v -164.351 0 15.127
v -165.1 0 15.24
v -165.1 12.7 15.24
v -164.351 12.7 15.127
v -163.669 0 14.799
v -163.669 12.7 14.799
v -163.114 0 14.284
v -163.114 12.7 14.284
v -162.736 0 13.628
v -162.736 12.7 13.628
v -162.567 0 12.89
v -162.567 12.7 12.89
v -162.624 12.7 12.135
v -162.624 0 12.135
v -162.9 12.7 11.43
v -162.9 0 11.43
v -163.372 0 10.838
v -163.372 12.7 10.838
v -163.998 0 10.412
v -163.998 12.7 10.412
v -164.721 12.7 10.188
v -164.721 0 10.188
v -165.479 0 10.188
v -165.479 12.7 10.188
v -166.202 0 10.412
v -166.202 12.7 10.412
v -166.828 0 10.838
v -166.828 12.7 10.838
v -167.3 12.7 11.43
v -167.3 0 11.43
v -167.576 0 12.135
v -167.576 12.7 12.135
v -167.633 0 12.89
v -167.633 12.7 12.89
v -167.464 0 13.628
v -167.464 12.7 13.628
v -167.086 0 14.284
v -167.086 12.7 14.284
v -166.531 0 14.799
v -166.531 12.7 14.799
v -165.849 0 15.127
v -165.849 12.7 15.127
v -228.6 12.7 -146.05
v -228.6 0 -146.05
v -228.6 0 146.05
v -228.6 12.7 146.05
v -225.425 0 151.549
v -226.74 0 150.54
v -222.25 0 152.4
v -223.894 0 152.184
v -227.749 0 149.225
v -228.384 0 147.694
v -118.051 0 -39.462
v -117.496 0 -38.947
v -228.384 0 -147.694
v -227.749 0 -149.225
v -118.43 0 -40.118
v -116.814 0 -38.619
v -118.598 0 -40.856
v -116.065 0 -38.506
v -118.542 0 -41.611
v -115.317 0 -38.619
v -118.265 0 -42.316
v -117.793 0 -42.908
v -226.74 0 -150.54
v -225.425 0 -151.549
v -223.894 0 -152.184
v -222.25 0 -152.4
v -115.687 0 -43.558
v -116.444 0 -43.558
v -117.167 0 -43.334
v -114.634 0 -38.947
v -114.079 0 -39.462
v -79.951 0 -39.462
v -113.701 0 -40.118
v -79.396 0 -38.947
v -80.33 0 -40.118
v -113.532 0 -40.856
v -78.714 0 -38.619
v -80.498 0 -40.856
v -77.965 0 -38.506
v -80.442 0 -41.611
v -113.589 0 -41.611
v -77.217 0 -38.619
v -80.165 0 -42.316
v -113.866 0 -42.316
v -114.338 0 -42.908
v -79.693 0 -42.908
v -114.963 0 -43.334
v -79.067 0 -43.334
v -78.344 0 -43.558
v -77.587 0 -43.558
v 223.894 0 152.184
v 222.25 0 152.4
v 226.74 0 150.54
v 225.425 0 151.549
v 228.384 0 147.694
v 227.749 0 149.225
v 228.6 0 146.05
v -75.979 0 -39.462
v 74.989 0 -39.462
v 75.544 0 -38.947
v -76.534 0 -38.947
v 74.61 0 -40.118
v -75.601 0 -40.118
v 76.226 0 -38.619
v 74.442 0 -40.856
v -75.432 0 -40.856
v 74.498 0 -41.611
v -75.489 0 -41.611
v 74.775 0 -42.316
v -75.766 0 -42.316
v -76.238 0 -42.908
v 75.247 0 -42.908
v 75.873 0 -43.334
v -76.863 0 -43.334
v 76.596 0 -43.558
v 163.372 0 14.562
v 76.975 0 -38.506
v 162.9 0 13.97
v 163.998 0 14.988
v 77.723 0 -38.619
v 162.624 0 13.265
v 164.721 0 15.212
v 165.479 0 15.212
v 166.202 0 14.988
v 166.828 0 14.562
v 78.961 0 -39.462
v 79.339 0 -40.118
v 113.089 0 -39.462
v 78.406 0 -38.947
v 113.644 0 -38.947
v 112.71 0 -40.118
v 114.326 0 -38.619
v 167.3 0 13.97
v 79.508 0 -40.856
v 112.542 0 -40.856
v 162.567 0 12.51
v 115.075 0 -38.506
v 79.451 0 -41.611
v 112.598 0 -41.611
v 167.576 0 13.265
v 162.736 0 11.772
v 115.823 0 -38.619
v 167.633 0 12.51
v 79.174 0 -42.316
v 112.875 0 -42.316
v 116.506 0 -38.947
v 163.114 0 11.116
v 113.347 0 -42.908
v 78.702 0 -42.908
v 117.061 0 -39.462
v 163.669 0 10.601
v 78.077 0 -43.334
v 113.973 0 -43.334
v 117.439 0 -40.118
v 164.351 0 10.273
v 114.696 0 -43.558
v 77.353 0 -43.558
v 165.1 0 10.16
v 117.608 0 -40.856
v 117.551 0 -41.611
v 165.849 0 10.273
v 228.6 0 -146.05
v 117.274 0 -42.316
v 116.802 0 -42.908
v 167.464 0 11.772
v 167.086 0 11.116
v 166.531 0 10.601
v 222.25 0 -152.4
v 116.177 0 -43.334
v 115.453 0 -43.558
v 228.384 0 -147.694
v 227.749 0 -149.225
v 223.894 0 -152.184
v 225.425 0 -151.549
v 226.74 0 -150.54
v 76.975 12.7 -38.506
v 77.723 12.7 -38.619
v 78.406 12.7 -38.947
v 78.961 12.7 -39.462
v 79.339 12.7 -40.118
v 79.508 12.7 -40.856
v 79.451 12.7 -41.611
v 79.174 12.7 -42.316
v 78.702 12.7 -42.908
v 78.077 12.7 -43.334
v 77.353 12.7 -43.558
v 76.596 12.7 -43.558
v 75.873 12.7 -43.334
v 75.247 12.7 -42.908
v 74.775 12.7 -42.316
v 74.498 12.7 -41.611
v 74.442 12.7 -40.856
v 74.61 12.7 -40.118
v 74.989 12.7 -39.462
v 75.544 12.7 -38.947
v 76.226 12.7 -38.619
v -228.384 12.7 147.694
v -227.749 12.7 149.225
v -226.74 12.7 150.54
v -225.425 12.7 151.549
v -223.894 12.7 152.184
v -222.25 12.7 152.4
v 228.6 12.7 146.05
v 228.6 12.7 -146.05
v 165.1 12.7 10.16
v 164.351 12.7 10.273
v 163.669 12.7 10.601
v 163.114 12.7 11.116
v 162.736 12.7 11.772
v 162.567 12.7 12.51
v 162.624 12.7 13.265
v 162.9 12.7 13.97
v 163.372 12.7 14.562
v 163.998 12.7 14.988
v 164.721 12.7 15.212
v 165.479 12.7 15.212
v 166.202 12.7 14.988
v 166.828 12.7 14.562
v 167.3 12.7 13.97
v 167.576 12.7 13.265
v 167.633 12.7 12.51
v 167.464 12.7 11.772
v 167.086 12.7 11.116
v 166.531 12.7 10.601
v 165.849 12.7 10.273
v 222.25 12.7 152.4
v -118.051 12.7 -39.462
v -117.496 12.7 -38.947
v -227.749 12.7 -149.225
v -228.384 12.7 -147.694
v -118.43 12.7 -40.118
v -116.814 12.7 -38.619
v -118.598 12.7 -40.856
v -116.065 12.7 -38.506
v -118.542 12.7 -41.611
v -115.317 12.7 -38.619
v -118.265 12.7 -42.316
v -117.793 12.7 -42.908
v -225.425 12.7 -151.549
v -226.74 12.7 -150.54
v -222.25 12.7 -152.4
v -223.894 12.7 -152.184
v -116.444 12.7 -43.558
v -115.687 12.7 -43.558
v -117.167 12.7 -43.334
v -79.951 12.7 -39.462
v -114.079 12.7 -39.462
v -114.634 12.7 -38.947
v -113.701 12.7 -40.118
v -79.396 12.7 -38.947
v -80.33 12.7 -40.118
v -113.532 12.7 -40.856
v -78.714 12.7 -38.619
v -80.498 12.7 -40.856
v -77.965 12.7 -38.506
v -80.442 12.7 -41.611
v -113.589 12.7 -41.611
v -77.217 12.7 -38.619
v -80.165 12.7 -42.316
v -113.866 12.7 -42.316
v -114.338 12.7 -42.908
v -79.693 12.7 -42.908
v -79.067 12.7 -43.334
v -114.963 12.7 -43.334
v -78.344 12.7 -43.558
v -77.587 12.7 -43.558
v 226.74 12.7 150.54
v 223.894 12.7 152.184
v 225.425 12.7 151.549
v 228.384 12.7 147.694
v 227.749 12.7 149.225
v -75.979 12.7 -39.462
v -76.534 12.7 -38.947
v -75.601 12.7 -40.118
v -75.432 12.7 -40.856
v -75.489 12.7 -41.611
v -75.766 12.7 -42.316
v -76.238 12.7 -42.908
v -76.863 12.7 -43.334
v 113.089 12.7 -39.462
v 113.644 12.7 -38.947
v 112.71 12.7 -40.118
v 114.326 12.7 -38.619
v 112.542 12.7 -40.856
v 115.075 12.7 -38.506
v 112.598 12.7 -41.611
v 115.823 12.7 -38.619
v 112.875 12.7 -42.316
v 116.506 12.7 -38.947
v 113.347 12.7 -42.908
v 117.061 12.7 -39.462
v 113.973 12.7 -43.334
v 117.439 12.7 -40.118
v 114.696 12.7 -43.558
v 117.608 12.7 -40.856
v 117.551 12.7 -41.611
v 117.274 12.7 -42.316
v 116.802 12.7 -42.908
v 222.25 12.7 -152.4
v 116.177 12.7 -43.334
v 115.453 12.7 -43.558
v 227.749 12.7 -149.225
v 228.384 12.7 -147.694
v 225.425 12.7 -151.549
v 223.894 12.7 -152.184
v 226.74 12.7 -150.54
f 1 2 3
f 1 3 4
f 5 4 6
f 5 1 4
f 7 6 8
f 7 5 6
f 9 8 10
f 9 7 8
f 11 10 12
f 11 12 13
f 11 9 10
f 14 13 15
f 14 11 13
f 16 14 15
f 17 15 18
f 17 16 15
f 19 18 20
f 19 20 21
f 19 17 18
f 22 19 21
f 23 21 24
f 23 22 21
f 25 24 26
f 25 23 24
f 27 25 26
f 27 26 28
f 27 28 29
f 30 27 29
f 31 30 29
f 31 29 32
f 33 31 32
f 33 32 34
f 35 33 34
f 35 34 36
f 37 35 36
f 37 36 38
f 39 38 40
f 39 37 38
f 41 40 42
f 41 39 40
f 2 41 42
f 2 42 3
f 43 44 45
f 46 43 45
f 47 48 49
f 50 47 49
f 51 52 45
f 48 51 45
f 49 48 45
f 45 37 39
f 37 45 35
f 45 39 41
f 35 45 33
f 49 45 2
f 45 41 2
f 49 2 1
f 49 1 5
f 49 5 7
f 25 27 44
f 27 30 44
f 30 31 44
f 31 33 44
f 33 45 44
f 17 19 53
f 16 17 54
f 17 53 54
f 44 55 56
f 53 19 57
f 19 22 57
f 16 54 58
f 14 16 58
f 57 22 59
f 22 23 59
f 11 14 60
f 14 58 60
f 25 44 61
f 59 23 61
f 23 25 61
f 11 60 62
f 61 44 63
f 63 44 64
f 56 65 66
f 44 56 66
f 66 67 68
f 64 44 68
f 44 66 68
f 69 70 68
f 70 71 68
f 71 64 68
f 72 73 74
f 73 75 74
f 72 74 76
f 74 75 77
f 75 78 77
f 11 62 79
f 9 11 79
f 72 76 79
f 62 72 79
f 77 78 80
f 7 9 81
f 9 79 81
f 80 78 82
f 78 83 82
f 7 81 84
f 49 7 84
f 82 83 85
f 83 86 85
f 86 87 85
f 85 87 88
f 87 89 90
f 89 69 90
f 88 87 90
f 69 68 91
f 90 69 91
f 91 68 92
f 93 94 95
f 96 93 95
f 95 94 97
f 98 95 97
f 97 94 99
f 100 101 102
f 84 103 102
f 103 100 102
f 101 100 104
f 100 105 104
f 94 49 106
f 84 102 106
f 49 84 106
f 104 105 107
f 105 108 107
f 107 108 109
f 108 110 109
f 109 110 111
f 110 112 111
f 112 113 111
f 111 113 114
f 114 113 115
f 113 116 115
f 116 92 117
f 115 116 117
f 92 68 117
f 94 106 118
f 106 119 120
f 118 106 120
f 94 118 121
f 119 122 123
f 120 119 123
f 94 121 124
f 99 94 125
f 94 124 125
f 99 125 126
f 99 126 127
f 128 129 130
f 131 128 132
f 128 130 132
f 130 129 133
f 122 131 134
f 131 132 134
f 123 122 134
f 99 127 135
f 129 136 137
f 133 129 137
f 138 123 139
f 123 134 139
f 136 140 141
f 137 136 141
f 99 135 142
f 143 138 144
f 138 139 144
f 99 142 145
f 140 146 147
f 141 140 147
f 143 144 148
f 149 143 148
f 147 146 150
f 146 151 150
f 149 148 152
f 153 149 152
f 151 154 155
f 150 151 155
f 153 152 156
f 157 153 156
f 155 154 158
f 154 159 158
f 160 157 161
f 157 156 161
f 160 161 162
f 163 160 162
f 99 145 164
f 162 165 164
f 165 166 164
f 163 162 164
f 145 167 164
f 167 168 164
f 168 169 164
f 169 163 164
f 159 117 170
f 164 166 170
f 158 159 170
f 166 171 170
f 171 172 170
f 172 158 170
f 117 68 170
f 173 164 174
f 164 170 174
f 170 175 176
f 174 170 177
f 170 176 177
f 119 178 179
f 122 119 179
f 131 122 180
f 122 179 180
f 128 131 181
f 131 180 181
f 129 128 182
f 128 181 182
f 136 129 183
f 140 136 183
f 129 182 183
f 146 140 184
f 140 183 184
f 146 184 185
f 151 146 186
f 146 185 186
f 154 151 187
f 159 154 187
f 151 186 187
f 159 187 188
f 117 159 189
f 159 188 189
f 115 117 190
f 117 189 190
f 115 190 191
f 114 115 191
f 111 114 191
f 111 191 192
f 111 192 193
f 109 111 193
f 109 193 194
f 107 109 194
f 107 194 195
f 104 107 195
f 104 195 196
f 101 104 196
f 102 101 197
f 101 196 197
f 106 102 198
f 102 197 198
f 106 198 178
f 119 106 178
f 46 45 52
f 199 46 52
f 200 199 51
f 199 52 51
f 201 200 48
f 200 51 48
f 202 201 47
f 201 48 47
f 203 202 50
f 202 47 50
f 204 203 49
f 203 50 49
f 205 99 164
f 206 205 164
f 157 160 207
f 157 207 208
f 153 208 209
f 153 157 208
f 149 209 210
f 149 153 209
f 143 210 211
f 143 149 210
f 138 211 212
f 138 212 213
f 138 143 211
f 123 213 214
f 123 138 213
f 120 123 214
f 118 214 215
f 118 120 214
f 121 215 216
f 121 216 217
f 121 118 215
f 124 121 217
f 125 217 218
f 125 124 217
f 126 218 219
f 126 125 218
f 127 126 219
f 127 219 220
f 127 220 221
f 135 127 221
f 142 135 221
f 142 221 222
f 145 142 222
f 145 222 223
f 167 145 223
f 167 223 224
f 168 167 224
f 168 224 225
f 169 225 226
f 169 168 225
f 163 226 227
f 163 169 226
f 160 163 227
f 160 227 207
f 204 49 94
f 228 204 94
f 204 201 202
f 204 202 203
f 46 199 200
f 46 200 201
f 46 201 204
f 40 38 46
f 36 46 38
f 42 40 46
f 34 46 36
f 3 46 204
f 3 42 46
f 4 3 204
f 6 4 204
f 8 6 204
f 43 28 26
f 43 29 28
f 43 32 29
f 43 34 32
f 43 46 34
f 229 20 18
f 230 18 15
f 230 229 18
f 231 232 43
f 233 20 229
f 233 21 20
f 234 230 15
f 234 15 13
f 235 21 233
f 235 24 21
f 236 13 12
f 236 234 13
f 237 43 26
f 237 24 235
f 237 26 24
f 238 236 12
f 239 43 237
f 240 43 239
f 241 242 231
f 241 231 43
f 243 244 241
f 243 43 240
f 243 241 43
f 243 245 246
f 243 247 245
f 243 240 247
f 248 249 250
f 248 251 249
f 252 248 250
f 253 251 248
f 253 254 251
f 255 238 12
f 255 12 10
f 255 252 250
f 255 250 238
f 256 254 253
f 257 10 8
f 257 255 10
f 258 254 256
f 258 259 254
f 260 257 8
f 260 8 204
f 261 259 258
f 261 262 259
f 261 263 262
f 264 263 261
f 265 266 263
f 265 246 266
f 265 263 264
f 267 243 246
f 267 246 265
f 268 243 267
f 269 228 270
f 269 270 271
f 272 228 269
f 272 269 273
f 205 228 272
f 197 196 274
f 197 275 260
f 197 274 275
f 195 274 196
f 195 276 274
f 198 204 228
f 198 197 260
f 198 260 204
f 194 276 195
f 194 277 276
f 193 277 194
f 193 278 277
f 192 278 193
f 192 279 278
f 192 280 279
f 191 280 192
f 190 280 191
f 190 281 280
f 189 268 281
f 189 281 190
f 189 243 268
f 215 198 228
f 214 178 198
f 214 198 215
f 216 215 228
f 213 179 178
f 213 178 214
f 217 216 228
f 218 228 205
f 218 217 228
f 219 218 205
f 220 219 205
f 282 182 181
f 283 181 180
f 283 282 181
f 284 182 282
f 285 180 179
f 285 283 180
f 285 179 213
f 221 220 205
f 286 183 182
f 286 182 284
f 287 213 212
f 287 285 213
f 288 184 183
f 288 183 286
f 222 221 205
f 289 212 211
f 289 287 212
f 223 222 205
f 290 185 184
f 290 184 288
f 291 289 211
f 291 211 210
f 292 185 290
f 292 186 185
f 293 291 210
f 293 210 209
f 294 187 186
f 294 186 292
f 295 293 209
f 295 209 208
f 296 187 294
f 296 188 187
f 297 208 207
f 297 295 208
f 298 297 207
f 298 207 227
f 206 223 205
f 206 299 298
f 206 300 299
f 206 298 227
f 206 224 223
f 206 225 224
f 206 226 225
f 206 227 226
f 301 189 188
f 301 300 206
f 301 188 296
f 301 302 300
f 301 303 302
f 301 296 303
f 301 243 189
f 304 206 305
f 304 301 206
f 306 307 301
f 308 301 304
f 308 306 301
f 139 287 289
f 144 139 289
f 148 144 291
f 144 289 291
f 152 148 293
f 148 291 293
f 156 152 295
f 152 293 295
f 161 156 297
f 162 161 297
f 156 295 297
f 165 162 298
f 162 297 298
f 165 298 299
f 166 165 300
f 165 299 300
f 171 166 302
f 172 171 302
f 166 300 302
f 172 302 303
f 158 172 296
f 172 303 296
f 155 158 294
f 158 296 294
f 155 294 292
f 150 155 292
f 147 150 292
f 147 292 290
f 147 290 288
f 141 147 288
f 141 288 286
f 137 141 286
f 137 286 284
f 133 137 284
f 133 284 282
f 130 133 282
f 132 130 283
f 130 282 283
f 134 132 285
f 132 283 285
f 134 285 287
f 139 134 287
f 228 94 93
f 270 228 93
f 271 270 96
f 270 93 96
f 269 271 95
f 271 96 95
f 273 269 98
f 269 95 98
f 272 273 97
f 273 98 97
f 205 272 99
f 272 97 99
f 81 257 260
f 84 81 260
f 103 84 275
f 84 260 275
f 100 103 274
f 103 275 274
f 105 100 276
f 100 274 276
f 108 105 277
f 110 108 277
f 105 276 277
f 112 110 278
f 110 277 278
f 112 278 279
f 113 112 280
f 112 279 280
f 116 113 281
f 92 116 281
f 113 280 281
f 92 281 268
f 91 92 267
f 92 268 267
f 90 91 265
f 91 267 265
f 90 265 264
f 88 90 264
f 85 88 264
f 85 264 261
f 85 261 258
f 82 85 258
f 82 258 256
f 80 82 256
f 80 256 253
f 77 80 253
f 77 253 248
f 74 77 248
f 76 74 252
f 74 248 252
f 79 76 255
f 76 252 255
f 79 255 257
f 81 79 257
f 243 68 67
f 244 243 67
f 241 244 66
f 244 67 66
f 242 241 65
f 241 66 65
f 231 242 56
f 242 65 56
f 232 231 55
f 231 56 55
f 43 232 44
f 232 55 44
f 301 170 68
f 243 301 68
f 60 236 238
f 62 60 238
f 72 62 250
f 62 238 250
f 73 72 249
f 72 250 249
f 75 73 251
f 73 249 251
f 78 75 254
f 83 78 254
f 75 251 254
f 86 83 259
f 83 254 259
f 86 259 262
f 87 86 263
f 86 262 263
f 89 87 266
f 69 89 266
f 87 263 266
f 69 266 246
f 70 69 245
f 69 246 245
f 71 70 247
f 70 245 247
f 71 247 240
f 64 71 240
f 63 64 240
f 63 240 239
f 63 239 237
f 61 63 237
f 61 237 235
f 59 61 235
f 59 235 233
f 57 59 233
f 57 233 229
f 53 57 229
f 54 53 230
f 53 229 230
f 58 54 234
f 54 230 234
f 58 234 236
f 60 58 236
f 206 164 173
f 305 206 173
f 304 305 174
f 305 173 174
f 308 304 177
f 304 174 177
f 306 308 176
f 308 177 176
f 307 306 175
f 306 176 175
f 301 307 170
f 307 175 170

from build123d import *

# Parameters (mm, degrees)
SKETCH1_R           = 2.54
BOSS_EXTRUDE1_DEPTH = 12.7
SKETCH2_R           = 2.54
CUT_EXTRUDE1_DEPTH  = 12.7


with BuildPart() as part:
    # Sketch1 → Boss-Extrude1 (new body)
    with BuildSketch(Plane(origin=(0, 0, 0), x_dir=(1, 0, 0), z_dir=(0, 1, 0))):
        with BuildLine():
            Line((222.25, 152.4), (-222.25, 152.4))
            ThreePointArc((-222.25, 152.4), (-226.740128061, 150.540128061), (-228.6, 146.05))
            Line((-228.6, 146.05), (-228.6, -146.05))
            ThreePointArc((-228.6, -146.05), (-226.740128061, -150.540128061), (-222.25, -152.4))
            Line((-222.25, -152.4), (222.25, -152.4))
            ThreePointArc((222.25, -152.4), (226.740128061, -150.540128061), (228.6, -146.05))
            Line((228.6, -146.05), (228.6, 146.05))
            ThreePointArc((228.6, 146.05), (226.740128061, 150.540128061), (222.25, 152.4))
        make_face()
        with Locations(Location((-165.1, -12.7, 0), (0, 0, 270))):
            Circle(SKETCH1_R, mode=Mode.SUBTRACT)
        with Locations(Location((165.1, -12.7, 0), (0, 0, 90))):
            Circle(SKETCH1_R, mode=Mode.SUBTRACT)
    extrude(amount=BOSS_EXTRUDE1_DEPTH)

    # Sketch2 → Cut-Extrude1 (cut)
    with BuildSketch(Plane(origin=(0, 12.7, 0), x_dir=(1, 0, 0), z_dir=(0, 1, 0))):
        with Locations(Location((-116.06530762, 41.045936935, 0), (0, 0, 270))):
            Circle(SKETCH2_R)
        with Locations(Location((-77.96530762, 41.045936935, 0), (0, 0, 270))):
            Circle(SKETCH2_R)
        with Locations(Location((76.97469238, 41.045936935, 0), (0, 0, 270))):
            Circle(SKETCH2_R)
        with Locations(Location((115.07469238, 41.045936935, 0), (0, 0, 270))):
            Circle(SKETCH2_R)
    extrude(amount=-CUT_EXTRUDE1_DEPTH, mode=Mode.SUBTRACT)


solid = part.part
